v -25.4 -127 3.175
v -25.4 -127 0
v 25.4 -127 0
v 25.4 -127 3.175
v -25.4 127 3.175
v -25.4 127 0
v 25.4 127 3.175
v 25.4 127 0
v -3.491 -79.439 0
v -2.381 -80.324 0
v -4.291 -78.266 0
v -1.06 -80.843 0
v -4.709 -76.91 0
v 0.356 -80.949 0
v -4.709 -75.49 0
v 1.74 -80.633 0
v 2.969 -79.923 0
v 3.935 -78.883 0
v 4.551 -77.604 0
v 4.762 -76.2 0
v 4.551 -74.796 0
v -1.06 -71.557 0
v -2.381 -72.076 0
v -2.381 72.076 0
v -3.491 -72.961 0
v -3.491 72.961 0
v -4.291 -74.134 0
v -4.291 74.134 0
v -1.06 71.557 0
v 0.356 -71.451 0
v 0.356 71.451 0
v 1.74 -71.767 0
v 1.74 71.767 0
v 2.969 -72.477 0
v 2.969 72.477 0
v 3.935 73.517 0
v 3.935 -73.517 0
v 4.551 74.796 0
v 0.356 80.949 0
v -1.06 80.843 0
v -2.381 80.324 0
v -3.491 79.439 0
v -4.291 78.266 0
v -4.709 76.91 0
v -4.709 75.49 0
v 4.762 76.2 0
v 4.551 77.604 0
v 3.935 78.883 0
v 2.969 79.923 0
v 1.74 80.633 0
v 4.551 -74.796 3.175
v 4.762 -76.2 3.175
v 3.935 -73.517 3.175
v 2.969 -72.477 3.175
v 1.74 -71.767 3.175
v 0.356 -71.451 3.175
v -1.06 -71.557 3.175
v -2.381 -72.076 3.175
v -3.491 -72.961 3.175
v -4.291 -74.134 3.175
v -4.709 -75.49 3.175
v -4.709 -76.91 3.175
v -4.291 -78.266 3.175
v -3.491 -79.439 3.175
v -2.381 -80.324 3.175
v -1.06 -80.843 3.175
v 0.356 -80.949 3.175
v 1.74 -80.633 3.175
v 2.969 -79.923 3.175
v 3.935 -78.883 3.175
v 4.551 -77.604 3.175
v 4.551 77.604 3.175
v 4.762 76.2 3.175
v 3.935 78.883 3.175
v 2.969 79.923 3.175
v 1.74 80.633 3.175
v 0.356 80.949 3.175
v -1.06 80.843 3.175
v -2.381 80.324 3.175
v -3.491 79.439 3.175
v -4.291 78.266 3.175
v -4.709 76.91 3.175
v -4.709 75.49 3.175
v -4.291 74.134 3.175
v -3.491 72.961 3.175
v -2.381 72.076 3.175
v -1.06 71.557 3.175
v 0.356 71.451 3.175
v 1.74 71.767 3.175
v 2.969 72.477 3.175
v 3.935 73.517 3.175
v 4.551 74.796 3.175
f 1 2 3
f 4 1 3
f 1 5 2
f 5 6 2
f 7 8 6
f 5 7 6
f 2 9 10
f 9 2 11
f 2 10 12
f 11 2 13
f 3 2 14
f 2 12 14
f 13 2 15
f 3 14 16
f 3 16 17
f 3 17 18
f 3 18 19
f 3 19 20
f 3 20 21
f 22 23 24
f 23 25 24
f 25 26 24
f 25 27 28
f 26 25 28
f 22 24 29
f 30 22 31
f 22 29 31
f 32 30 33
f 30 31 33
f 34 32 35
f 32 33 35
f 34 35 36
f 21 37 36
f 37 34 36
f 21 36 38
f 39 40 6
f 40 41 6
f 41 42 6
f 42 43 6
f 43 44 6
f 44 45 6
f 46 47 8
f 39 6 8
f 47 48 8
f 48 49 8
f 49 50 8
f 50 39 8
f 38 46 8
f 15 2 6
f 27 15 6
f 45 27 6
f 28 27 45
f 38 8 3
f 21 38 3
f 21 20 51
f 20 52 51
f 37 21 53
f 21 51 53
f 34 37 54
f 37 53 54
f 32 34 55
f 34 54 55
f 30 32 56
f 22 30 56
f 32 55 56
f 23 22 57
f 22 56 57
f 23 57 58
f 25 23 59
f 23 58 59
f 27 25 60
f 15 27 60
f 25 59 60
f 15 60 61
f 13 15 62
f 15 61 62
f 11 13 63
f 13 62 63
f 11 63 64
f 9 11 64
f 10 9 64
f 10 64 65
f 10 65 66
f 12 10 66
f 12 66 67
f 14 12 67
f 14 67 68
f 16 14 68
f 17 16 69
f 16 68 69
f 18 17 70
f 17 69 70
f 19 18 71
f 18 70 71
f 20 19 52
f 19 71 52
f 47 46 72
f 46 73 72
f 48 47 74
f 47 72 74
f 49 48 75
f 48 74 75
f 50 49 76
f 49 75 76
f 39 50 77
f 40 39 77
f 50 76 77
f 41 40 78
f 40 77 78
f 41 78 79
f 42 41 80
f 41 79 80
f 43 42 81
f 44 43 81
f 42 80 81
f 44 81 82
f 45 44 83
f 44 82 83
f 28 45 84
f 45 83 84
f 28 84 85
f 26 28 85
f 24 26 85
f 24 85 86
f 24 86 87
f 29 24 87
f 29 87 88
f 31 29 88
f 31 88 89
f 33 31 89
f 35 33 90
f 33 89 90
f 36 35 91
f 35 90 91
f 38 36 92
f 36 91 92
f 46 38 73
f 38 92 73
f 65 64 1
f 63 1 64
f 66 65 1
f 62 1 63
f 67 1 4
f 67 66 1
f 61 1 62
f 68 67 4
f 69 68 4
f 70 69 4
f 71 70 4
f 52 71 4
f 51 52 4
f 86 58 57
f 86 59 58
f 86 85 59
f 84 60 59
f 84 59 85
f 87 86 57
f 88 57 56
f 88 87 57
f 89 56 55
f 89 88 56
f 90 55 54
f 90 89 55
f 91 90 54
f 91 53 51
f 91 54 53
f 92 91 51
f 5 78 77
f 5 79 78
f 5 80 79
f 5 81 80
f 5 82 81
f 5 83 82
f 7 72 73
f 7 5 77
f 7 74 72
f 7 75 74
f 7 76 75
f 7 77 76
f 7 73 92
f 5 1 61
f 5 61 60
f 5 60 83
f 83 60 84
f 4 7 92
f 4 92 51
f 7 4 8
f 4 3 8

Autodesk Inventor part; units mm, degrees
ref_plane "YZ Plane" through (0, 0, 0) normal (1, 0, 0) x (0, 1, 0)
ref_plane "XZ Plane" through (0, 0, 0) normal (0, 1, 0) x (-1, 0, 0)
ref_plane "XY Plane" through (0, 0, 0) normal (0, 0, 1) x (1, 0, 0)
sketch "Sketch1" plane through (0, 0, 0) normal (0, 0, 1) x (1, 0, 0)
  line L0 (-25.4, -127) -> (25.4, -127)
  line L1 (25.4, -127) -> (25.4, 127)
  line L2 (25.4, 127) -> (-25.4, 127)
  line L3 (-25.4, 127) -> (-25.4, -127)
  line L4 (-25.4, -127) -> (25.4, 127) construction
  line L5 (25.4, -127) -> (-25.4, 127) construction
  point P0 (0, 0)
  dimension "d0" = 50.8
  dimension "d1" = 254
extrude "Extrusion1" add sketch "Sketch1" along normal blind 3.175
sketch "Sketch2" plane through (0, 0, 3.175) normal (0, 0, 1) x (1, 0, 0)
  line L0 (25.4, 127) -> (-25.4, 127) construction
  line L1 (0, 127) -> (0, -127) construction
  line L2 (-25.4, -127) -> (25.4, -127) construction
  circle A0 centre (0, 76.2) radius 4.7625
  circle A1 centre (0, -76.2) radius 4.7625
  point P0 (0, 0)
  dimension "d4" = 50.8
  dimension "d5" = 50.8
  dimension "d6" = 9.525
  dimension "d7" = 9.525
extrude "Extrusion2" cut sketch "Sketch2" against normal through all
equation "\"d0\" = basicLiftWidth"
equation "\"d1\" = basicLiftLength"
equation "\"d2\" = basicLiftThickness"
equation "\"d4\" = basicLLiftAxelsDistanceFromTop"
equation "\"d5\" = basicLiftaxelDistancefromBottom"
equation "\"d6\" = baslicLiftAxelDiam"
equation "\"d7\" = baslicLiftAxelDiam"
equation "\"basicLiftLength\" = 254"
equation "\"basicLiftWidth\" = 50.8"
equation "\"basicLiftaxelDistancefromBottom\" = 50.8"
equation "\"basicLLiftAxelsDistanceFromTop\" = 50.8"
equation "\"basicLiftThickness\" = 3.175"
equation "\"baslicLiftAxelDiam\" = 9.525"
properties part number "basicLiftPlate" material "Aluminum 6061"
